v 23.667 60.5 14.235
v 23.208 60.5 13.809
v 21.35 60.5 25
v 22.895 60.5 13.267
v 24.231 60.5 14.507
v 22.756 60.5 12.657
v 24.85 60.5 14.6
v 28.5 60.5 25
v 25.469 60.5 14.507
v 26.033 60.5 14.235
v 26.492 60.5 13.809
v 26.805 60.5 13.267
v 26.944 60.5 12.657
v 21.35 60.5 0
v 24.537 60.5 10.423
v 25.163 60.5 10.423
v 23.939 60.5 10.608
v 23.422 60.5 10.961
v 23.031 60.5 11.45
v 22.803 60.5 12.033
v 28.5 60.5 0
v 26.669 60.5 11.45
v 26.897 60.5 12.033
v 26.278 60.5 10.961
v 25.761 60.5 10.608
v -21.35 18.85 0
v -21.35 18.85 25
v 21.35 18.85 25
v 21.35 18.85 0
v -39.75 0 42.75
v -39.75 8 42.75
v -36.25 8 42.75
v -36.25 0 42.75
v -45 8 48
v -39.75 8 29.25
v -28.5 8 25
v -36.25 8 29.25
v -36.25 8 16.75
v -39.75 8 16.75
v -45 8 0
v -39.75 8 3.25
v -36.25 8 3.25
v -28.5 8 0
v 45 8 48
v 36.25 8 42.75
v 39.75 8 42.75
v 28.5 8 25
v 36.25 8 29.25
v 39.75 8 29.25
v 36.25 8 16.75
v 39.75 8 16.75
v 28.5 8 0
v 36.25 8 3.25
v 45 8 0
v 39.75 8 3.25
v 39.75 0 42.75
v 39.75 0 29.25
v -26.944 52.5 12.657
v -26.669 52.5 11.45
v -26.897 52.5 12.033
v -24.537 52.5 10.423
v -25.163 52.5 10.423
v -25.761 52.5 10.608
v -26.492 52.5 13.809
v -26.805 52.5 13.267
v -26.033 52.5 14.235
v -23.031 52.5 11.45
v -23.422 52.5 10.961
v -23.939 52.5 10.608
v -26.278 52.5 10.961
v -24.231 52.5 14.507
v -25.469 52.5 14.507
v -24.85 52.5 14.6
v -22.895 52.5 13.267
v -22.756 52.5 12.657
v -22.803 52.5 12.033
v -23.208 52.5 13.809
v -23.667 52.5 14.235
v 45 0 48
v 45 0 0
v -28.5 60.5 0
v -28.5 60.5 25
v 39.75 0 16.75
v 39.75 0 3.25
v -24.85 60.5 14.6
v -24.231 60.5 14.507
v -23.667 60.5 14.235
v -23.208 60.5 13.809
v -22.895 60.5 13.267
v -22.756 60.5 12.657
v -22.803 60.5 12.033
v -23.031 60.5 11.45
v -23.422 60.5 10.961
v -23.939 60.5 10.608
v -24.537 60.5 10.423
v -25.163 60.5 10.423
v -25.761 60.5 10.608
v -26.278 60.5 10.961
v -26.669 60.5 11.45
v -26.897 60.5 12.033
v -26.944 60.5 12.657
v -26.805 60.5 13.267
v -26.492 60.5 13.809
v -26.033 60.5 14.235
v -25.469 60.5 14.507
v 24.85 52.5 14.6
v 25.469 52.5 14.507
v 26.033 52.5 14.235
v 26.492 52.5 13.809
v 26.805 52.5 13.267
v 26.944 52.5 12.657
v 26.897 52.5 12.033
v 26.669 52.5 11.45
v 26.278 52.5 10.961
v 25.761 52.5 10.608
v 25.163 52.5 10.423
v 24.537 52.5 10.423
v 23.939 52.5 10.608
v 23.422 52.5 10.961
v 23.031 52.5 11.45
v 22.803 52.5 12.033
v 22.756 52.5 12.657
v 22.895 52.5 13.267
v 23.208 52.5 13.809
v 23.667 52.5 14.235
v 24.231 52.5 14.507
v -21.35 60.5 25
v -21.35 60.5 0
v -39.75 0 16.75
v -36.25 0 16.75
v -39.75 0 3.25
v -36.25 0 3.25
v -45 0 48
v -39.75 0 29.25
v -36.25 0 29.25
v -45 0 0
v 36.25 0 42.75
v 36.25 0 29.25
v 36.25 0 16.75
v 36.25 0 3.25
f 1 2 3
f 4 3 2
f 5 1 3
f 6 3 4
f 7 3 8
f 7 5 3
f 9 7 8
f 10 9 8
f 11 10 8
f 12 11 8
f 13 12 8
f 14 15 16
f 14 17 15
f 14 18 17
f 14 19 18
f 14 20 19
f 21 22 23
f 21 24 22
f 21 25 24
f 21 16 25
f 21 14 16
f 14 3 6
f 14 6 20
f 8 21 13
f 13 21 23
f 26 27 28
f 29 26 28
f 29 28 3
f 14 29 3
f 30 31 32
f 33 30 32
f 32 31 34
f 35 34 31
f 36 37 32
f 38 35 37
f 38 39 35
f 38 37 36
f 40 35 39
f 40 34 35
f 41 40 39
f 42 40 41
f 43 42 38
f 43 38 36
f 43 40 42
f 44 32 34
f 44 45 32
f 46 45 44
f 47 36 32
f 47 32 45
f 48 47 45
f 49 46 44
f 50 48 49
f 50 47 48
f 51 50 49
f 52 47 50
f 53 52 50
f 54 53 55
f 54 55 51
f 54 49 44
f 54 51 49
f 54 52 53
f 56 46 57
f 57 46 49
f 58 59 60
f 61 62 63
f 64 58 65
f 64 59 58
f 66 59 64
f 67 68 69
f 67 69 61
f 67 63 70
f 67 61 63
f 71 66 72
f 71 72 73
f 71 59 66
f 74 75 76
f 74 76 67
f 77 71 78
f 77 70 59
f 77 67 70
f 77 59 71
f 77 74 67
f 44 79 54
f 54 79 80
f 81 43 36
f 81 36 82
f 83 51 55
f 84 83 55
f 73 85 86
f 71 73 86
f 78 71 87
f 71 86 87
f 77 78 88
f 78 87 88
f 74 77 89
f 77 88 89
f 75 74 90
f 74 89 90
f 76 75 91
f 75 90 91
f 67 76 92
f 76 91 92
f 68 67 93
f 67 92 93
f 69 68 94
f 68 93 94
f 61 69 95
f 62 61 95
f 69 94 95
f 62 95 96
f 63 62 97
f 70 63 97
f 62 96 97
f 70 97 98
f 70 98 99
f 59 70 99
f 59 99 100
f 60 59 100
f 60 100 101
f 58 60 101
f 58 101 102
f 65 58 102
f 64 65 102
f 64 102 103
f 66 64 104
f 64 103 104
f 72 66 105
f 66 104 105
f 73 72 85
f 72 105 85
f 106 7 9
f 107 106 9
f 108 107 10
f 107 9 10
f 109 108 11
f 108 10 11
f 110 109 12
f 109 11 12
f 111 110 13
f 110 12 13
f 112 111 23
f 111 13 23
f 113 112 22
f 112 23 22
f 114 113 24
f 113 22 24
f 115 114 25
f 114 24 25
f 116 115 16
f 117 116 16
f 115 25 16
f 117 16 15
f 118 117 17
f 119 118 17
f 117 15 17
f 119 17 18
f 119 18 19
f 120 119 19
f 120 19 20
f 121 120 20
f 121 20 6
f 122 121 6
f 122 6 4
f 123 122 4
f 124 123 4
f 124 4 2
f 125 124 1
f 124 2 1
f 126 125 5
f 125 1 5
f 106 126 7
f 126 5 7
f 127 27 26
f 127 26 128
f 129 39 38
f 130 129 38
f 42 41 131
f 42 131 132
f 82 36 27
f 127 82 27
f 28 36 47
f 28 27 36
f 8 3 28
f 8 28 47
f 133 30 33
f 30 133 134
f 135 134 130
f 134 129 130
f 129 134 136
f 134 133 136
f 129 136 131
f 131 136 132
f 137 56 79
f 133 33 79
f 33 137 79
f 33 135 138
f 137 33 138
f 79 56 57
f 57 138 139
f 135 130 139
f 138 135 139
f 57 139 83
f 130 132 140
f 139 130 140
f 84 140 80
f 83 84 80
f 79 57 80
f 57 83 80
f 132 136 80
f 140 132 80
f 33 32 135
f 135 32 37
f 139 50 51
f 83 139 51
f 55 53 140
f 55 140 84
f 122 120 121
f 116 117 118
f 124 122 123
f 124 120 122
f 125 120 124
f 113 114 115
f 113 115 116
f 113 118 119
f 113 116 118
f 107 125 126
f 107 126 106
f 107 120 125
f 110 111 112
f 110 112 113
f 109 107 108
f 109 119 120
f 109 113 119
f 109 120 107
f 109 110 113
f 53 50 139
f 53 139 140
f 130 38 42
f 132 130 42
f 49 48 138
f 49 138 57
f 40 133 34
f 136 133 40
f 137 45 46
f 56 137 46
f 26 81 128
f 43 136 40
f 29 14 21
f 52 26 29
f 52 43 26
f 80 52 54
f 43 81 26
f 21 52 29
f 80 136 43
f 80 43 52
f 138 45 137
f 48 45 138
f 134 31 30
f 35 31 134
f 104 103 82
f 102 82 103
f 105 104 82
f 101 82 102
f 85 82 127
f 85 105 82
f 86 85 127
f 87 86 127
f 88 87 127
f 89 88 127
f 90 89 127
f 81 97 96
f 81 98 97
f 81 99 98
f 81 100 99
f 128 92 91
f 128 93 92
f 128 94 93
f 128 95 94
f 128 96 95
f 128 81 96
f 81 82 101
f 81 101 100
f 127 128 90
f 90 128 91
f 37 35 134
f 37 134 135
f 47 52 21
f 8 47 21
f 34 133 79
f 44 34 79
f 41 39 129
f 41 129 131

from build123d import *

# Parameters (mm, degrees)
SKETCH1_W            = 57
SKETCH1_H            = 60.5
BOSS_EXTRUDE1_DEPTH  = 25
SKETCH2_W            = 42.7
SKETCH2_H            = 43.793176539
CUT_EXTRUDE1_DEPTH   = 72.396778639
SKETCH3_W            = 90
SKETCH3_H            = 48
BOSS_EXTRUDE2_DEPTH  = 8
SKETCH4_W            = 3.5
SKETCH4_H            = 13.5
CUT_EXTRUDE2_DEPTH   = 85.17392708
LPATTERN1_COUNT      = 2
LPATTERN1_PITCH      = 76
LPATTERN1_COUNT_DIR2 = 2
LPATTERN1_PITCH_DIR2 = 26
SKETCH5_R            = 2.1
CUT_EXTRUDE3_DEPTH   = 8


with BuildPart() as part:
    # Sketch1 → Boss-Extrude1 (new body)
    with BuildSketch(Plane.XY):
        with Locations((0, 30.25)):
            Rectangle(SKETCH1_W, SKETCH1_H)
    extrude(amount=BOSS_EXTRUDE1_DEPTH)

    # Sketch2 → Cut-Extrude1 (cut, through all)
    with BuildSketch(Plane.XY.offset(25)):
        with Locations((0, 40.74658827)):
            Rectangle(SKETCH2_W, SKETCH2_H)
    extrude(amount=-CUT_EXTRUDE1_DEPTH, mode=Mode.SUBTRACT)

    # Sketch3 → Boss-Extrude2 (add)
    with BuildSketch(Plane(origin=(0, 0, 0), x_dir=(1, 0, 0), z_dir=(0, 1, 0))):
        with Locations((0, -24)):
            Rectangle(SKETCH3_W, SKETCH3_H)
    extrude(amount=BOSS_EXTRUDE2_DEPTH)

    # Sketch4 → Cut-Extrude2 (cut, through all)
    with BuildSketch(Plane(origin=(0, 8, 0), x_dir=(1, 0, 0), z_dir=(0, 1, 0))):
        with Locations((-38, -10)):
            Rectangle(SKETCH4_W, SKETCH4_H)
    cut_extrude2 = extrude(amount=-CUT_EXTRUDE2_DEPTH, mode=Mode.SUBTRACT)

    # LPattern1: Cut-Extrude2 2 × 2
    with Locations(*[(i * LPATTERN1_PITCH, 0, j * LPATTERN1_PITCH_DIR2) for i in range(LPATTERN1_COUNT) for j in range(LPATTERN1_COUNT_DIR2) if (i, j) != (0, 0)]):
        add(cut_extrude2, mode=Mode.SUBTRACT)

    # Sketch5 → Cut-Extrude3 (cut)
    with BuildSketch(Plane(origin=(0, 60.5, 0), x_dir=(1, 0, 0), z_dir=(0, 1, 0))):
        with Locations(Location((-24.85, -12.5, 0), (0, 0, 270))):
            Circle(SKETCH5_R)
        with Locations(Location((24.85, -12.5, 0), (0, 0, 270))):
            Circle(SKETCH5_R)
    extrude(amount=-CUT_EXTRUDE3_DEPTH, mode=Mode.SUBTRACT)


solid = part.part
